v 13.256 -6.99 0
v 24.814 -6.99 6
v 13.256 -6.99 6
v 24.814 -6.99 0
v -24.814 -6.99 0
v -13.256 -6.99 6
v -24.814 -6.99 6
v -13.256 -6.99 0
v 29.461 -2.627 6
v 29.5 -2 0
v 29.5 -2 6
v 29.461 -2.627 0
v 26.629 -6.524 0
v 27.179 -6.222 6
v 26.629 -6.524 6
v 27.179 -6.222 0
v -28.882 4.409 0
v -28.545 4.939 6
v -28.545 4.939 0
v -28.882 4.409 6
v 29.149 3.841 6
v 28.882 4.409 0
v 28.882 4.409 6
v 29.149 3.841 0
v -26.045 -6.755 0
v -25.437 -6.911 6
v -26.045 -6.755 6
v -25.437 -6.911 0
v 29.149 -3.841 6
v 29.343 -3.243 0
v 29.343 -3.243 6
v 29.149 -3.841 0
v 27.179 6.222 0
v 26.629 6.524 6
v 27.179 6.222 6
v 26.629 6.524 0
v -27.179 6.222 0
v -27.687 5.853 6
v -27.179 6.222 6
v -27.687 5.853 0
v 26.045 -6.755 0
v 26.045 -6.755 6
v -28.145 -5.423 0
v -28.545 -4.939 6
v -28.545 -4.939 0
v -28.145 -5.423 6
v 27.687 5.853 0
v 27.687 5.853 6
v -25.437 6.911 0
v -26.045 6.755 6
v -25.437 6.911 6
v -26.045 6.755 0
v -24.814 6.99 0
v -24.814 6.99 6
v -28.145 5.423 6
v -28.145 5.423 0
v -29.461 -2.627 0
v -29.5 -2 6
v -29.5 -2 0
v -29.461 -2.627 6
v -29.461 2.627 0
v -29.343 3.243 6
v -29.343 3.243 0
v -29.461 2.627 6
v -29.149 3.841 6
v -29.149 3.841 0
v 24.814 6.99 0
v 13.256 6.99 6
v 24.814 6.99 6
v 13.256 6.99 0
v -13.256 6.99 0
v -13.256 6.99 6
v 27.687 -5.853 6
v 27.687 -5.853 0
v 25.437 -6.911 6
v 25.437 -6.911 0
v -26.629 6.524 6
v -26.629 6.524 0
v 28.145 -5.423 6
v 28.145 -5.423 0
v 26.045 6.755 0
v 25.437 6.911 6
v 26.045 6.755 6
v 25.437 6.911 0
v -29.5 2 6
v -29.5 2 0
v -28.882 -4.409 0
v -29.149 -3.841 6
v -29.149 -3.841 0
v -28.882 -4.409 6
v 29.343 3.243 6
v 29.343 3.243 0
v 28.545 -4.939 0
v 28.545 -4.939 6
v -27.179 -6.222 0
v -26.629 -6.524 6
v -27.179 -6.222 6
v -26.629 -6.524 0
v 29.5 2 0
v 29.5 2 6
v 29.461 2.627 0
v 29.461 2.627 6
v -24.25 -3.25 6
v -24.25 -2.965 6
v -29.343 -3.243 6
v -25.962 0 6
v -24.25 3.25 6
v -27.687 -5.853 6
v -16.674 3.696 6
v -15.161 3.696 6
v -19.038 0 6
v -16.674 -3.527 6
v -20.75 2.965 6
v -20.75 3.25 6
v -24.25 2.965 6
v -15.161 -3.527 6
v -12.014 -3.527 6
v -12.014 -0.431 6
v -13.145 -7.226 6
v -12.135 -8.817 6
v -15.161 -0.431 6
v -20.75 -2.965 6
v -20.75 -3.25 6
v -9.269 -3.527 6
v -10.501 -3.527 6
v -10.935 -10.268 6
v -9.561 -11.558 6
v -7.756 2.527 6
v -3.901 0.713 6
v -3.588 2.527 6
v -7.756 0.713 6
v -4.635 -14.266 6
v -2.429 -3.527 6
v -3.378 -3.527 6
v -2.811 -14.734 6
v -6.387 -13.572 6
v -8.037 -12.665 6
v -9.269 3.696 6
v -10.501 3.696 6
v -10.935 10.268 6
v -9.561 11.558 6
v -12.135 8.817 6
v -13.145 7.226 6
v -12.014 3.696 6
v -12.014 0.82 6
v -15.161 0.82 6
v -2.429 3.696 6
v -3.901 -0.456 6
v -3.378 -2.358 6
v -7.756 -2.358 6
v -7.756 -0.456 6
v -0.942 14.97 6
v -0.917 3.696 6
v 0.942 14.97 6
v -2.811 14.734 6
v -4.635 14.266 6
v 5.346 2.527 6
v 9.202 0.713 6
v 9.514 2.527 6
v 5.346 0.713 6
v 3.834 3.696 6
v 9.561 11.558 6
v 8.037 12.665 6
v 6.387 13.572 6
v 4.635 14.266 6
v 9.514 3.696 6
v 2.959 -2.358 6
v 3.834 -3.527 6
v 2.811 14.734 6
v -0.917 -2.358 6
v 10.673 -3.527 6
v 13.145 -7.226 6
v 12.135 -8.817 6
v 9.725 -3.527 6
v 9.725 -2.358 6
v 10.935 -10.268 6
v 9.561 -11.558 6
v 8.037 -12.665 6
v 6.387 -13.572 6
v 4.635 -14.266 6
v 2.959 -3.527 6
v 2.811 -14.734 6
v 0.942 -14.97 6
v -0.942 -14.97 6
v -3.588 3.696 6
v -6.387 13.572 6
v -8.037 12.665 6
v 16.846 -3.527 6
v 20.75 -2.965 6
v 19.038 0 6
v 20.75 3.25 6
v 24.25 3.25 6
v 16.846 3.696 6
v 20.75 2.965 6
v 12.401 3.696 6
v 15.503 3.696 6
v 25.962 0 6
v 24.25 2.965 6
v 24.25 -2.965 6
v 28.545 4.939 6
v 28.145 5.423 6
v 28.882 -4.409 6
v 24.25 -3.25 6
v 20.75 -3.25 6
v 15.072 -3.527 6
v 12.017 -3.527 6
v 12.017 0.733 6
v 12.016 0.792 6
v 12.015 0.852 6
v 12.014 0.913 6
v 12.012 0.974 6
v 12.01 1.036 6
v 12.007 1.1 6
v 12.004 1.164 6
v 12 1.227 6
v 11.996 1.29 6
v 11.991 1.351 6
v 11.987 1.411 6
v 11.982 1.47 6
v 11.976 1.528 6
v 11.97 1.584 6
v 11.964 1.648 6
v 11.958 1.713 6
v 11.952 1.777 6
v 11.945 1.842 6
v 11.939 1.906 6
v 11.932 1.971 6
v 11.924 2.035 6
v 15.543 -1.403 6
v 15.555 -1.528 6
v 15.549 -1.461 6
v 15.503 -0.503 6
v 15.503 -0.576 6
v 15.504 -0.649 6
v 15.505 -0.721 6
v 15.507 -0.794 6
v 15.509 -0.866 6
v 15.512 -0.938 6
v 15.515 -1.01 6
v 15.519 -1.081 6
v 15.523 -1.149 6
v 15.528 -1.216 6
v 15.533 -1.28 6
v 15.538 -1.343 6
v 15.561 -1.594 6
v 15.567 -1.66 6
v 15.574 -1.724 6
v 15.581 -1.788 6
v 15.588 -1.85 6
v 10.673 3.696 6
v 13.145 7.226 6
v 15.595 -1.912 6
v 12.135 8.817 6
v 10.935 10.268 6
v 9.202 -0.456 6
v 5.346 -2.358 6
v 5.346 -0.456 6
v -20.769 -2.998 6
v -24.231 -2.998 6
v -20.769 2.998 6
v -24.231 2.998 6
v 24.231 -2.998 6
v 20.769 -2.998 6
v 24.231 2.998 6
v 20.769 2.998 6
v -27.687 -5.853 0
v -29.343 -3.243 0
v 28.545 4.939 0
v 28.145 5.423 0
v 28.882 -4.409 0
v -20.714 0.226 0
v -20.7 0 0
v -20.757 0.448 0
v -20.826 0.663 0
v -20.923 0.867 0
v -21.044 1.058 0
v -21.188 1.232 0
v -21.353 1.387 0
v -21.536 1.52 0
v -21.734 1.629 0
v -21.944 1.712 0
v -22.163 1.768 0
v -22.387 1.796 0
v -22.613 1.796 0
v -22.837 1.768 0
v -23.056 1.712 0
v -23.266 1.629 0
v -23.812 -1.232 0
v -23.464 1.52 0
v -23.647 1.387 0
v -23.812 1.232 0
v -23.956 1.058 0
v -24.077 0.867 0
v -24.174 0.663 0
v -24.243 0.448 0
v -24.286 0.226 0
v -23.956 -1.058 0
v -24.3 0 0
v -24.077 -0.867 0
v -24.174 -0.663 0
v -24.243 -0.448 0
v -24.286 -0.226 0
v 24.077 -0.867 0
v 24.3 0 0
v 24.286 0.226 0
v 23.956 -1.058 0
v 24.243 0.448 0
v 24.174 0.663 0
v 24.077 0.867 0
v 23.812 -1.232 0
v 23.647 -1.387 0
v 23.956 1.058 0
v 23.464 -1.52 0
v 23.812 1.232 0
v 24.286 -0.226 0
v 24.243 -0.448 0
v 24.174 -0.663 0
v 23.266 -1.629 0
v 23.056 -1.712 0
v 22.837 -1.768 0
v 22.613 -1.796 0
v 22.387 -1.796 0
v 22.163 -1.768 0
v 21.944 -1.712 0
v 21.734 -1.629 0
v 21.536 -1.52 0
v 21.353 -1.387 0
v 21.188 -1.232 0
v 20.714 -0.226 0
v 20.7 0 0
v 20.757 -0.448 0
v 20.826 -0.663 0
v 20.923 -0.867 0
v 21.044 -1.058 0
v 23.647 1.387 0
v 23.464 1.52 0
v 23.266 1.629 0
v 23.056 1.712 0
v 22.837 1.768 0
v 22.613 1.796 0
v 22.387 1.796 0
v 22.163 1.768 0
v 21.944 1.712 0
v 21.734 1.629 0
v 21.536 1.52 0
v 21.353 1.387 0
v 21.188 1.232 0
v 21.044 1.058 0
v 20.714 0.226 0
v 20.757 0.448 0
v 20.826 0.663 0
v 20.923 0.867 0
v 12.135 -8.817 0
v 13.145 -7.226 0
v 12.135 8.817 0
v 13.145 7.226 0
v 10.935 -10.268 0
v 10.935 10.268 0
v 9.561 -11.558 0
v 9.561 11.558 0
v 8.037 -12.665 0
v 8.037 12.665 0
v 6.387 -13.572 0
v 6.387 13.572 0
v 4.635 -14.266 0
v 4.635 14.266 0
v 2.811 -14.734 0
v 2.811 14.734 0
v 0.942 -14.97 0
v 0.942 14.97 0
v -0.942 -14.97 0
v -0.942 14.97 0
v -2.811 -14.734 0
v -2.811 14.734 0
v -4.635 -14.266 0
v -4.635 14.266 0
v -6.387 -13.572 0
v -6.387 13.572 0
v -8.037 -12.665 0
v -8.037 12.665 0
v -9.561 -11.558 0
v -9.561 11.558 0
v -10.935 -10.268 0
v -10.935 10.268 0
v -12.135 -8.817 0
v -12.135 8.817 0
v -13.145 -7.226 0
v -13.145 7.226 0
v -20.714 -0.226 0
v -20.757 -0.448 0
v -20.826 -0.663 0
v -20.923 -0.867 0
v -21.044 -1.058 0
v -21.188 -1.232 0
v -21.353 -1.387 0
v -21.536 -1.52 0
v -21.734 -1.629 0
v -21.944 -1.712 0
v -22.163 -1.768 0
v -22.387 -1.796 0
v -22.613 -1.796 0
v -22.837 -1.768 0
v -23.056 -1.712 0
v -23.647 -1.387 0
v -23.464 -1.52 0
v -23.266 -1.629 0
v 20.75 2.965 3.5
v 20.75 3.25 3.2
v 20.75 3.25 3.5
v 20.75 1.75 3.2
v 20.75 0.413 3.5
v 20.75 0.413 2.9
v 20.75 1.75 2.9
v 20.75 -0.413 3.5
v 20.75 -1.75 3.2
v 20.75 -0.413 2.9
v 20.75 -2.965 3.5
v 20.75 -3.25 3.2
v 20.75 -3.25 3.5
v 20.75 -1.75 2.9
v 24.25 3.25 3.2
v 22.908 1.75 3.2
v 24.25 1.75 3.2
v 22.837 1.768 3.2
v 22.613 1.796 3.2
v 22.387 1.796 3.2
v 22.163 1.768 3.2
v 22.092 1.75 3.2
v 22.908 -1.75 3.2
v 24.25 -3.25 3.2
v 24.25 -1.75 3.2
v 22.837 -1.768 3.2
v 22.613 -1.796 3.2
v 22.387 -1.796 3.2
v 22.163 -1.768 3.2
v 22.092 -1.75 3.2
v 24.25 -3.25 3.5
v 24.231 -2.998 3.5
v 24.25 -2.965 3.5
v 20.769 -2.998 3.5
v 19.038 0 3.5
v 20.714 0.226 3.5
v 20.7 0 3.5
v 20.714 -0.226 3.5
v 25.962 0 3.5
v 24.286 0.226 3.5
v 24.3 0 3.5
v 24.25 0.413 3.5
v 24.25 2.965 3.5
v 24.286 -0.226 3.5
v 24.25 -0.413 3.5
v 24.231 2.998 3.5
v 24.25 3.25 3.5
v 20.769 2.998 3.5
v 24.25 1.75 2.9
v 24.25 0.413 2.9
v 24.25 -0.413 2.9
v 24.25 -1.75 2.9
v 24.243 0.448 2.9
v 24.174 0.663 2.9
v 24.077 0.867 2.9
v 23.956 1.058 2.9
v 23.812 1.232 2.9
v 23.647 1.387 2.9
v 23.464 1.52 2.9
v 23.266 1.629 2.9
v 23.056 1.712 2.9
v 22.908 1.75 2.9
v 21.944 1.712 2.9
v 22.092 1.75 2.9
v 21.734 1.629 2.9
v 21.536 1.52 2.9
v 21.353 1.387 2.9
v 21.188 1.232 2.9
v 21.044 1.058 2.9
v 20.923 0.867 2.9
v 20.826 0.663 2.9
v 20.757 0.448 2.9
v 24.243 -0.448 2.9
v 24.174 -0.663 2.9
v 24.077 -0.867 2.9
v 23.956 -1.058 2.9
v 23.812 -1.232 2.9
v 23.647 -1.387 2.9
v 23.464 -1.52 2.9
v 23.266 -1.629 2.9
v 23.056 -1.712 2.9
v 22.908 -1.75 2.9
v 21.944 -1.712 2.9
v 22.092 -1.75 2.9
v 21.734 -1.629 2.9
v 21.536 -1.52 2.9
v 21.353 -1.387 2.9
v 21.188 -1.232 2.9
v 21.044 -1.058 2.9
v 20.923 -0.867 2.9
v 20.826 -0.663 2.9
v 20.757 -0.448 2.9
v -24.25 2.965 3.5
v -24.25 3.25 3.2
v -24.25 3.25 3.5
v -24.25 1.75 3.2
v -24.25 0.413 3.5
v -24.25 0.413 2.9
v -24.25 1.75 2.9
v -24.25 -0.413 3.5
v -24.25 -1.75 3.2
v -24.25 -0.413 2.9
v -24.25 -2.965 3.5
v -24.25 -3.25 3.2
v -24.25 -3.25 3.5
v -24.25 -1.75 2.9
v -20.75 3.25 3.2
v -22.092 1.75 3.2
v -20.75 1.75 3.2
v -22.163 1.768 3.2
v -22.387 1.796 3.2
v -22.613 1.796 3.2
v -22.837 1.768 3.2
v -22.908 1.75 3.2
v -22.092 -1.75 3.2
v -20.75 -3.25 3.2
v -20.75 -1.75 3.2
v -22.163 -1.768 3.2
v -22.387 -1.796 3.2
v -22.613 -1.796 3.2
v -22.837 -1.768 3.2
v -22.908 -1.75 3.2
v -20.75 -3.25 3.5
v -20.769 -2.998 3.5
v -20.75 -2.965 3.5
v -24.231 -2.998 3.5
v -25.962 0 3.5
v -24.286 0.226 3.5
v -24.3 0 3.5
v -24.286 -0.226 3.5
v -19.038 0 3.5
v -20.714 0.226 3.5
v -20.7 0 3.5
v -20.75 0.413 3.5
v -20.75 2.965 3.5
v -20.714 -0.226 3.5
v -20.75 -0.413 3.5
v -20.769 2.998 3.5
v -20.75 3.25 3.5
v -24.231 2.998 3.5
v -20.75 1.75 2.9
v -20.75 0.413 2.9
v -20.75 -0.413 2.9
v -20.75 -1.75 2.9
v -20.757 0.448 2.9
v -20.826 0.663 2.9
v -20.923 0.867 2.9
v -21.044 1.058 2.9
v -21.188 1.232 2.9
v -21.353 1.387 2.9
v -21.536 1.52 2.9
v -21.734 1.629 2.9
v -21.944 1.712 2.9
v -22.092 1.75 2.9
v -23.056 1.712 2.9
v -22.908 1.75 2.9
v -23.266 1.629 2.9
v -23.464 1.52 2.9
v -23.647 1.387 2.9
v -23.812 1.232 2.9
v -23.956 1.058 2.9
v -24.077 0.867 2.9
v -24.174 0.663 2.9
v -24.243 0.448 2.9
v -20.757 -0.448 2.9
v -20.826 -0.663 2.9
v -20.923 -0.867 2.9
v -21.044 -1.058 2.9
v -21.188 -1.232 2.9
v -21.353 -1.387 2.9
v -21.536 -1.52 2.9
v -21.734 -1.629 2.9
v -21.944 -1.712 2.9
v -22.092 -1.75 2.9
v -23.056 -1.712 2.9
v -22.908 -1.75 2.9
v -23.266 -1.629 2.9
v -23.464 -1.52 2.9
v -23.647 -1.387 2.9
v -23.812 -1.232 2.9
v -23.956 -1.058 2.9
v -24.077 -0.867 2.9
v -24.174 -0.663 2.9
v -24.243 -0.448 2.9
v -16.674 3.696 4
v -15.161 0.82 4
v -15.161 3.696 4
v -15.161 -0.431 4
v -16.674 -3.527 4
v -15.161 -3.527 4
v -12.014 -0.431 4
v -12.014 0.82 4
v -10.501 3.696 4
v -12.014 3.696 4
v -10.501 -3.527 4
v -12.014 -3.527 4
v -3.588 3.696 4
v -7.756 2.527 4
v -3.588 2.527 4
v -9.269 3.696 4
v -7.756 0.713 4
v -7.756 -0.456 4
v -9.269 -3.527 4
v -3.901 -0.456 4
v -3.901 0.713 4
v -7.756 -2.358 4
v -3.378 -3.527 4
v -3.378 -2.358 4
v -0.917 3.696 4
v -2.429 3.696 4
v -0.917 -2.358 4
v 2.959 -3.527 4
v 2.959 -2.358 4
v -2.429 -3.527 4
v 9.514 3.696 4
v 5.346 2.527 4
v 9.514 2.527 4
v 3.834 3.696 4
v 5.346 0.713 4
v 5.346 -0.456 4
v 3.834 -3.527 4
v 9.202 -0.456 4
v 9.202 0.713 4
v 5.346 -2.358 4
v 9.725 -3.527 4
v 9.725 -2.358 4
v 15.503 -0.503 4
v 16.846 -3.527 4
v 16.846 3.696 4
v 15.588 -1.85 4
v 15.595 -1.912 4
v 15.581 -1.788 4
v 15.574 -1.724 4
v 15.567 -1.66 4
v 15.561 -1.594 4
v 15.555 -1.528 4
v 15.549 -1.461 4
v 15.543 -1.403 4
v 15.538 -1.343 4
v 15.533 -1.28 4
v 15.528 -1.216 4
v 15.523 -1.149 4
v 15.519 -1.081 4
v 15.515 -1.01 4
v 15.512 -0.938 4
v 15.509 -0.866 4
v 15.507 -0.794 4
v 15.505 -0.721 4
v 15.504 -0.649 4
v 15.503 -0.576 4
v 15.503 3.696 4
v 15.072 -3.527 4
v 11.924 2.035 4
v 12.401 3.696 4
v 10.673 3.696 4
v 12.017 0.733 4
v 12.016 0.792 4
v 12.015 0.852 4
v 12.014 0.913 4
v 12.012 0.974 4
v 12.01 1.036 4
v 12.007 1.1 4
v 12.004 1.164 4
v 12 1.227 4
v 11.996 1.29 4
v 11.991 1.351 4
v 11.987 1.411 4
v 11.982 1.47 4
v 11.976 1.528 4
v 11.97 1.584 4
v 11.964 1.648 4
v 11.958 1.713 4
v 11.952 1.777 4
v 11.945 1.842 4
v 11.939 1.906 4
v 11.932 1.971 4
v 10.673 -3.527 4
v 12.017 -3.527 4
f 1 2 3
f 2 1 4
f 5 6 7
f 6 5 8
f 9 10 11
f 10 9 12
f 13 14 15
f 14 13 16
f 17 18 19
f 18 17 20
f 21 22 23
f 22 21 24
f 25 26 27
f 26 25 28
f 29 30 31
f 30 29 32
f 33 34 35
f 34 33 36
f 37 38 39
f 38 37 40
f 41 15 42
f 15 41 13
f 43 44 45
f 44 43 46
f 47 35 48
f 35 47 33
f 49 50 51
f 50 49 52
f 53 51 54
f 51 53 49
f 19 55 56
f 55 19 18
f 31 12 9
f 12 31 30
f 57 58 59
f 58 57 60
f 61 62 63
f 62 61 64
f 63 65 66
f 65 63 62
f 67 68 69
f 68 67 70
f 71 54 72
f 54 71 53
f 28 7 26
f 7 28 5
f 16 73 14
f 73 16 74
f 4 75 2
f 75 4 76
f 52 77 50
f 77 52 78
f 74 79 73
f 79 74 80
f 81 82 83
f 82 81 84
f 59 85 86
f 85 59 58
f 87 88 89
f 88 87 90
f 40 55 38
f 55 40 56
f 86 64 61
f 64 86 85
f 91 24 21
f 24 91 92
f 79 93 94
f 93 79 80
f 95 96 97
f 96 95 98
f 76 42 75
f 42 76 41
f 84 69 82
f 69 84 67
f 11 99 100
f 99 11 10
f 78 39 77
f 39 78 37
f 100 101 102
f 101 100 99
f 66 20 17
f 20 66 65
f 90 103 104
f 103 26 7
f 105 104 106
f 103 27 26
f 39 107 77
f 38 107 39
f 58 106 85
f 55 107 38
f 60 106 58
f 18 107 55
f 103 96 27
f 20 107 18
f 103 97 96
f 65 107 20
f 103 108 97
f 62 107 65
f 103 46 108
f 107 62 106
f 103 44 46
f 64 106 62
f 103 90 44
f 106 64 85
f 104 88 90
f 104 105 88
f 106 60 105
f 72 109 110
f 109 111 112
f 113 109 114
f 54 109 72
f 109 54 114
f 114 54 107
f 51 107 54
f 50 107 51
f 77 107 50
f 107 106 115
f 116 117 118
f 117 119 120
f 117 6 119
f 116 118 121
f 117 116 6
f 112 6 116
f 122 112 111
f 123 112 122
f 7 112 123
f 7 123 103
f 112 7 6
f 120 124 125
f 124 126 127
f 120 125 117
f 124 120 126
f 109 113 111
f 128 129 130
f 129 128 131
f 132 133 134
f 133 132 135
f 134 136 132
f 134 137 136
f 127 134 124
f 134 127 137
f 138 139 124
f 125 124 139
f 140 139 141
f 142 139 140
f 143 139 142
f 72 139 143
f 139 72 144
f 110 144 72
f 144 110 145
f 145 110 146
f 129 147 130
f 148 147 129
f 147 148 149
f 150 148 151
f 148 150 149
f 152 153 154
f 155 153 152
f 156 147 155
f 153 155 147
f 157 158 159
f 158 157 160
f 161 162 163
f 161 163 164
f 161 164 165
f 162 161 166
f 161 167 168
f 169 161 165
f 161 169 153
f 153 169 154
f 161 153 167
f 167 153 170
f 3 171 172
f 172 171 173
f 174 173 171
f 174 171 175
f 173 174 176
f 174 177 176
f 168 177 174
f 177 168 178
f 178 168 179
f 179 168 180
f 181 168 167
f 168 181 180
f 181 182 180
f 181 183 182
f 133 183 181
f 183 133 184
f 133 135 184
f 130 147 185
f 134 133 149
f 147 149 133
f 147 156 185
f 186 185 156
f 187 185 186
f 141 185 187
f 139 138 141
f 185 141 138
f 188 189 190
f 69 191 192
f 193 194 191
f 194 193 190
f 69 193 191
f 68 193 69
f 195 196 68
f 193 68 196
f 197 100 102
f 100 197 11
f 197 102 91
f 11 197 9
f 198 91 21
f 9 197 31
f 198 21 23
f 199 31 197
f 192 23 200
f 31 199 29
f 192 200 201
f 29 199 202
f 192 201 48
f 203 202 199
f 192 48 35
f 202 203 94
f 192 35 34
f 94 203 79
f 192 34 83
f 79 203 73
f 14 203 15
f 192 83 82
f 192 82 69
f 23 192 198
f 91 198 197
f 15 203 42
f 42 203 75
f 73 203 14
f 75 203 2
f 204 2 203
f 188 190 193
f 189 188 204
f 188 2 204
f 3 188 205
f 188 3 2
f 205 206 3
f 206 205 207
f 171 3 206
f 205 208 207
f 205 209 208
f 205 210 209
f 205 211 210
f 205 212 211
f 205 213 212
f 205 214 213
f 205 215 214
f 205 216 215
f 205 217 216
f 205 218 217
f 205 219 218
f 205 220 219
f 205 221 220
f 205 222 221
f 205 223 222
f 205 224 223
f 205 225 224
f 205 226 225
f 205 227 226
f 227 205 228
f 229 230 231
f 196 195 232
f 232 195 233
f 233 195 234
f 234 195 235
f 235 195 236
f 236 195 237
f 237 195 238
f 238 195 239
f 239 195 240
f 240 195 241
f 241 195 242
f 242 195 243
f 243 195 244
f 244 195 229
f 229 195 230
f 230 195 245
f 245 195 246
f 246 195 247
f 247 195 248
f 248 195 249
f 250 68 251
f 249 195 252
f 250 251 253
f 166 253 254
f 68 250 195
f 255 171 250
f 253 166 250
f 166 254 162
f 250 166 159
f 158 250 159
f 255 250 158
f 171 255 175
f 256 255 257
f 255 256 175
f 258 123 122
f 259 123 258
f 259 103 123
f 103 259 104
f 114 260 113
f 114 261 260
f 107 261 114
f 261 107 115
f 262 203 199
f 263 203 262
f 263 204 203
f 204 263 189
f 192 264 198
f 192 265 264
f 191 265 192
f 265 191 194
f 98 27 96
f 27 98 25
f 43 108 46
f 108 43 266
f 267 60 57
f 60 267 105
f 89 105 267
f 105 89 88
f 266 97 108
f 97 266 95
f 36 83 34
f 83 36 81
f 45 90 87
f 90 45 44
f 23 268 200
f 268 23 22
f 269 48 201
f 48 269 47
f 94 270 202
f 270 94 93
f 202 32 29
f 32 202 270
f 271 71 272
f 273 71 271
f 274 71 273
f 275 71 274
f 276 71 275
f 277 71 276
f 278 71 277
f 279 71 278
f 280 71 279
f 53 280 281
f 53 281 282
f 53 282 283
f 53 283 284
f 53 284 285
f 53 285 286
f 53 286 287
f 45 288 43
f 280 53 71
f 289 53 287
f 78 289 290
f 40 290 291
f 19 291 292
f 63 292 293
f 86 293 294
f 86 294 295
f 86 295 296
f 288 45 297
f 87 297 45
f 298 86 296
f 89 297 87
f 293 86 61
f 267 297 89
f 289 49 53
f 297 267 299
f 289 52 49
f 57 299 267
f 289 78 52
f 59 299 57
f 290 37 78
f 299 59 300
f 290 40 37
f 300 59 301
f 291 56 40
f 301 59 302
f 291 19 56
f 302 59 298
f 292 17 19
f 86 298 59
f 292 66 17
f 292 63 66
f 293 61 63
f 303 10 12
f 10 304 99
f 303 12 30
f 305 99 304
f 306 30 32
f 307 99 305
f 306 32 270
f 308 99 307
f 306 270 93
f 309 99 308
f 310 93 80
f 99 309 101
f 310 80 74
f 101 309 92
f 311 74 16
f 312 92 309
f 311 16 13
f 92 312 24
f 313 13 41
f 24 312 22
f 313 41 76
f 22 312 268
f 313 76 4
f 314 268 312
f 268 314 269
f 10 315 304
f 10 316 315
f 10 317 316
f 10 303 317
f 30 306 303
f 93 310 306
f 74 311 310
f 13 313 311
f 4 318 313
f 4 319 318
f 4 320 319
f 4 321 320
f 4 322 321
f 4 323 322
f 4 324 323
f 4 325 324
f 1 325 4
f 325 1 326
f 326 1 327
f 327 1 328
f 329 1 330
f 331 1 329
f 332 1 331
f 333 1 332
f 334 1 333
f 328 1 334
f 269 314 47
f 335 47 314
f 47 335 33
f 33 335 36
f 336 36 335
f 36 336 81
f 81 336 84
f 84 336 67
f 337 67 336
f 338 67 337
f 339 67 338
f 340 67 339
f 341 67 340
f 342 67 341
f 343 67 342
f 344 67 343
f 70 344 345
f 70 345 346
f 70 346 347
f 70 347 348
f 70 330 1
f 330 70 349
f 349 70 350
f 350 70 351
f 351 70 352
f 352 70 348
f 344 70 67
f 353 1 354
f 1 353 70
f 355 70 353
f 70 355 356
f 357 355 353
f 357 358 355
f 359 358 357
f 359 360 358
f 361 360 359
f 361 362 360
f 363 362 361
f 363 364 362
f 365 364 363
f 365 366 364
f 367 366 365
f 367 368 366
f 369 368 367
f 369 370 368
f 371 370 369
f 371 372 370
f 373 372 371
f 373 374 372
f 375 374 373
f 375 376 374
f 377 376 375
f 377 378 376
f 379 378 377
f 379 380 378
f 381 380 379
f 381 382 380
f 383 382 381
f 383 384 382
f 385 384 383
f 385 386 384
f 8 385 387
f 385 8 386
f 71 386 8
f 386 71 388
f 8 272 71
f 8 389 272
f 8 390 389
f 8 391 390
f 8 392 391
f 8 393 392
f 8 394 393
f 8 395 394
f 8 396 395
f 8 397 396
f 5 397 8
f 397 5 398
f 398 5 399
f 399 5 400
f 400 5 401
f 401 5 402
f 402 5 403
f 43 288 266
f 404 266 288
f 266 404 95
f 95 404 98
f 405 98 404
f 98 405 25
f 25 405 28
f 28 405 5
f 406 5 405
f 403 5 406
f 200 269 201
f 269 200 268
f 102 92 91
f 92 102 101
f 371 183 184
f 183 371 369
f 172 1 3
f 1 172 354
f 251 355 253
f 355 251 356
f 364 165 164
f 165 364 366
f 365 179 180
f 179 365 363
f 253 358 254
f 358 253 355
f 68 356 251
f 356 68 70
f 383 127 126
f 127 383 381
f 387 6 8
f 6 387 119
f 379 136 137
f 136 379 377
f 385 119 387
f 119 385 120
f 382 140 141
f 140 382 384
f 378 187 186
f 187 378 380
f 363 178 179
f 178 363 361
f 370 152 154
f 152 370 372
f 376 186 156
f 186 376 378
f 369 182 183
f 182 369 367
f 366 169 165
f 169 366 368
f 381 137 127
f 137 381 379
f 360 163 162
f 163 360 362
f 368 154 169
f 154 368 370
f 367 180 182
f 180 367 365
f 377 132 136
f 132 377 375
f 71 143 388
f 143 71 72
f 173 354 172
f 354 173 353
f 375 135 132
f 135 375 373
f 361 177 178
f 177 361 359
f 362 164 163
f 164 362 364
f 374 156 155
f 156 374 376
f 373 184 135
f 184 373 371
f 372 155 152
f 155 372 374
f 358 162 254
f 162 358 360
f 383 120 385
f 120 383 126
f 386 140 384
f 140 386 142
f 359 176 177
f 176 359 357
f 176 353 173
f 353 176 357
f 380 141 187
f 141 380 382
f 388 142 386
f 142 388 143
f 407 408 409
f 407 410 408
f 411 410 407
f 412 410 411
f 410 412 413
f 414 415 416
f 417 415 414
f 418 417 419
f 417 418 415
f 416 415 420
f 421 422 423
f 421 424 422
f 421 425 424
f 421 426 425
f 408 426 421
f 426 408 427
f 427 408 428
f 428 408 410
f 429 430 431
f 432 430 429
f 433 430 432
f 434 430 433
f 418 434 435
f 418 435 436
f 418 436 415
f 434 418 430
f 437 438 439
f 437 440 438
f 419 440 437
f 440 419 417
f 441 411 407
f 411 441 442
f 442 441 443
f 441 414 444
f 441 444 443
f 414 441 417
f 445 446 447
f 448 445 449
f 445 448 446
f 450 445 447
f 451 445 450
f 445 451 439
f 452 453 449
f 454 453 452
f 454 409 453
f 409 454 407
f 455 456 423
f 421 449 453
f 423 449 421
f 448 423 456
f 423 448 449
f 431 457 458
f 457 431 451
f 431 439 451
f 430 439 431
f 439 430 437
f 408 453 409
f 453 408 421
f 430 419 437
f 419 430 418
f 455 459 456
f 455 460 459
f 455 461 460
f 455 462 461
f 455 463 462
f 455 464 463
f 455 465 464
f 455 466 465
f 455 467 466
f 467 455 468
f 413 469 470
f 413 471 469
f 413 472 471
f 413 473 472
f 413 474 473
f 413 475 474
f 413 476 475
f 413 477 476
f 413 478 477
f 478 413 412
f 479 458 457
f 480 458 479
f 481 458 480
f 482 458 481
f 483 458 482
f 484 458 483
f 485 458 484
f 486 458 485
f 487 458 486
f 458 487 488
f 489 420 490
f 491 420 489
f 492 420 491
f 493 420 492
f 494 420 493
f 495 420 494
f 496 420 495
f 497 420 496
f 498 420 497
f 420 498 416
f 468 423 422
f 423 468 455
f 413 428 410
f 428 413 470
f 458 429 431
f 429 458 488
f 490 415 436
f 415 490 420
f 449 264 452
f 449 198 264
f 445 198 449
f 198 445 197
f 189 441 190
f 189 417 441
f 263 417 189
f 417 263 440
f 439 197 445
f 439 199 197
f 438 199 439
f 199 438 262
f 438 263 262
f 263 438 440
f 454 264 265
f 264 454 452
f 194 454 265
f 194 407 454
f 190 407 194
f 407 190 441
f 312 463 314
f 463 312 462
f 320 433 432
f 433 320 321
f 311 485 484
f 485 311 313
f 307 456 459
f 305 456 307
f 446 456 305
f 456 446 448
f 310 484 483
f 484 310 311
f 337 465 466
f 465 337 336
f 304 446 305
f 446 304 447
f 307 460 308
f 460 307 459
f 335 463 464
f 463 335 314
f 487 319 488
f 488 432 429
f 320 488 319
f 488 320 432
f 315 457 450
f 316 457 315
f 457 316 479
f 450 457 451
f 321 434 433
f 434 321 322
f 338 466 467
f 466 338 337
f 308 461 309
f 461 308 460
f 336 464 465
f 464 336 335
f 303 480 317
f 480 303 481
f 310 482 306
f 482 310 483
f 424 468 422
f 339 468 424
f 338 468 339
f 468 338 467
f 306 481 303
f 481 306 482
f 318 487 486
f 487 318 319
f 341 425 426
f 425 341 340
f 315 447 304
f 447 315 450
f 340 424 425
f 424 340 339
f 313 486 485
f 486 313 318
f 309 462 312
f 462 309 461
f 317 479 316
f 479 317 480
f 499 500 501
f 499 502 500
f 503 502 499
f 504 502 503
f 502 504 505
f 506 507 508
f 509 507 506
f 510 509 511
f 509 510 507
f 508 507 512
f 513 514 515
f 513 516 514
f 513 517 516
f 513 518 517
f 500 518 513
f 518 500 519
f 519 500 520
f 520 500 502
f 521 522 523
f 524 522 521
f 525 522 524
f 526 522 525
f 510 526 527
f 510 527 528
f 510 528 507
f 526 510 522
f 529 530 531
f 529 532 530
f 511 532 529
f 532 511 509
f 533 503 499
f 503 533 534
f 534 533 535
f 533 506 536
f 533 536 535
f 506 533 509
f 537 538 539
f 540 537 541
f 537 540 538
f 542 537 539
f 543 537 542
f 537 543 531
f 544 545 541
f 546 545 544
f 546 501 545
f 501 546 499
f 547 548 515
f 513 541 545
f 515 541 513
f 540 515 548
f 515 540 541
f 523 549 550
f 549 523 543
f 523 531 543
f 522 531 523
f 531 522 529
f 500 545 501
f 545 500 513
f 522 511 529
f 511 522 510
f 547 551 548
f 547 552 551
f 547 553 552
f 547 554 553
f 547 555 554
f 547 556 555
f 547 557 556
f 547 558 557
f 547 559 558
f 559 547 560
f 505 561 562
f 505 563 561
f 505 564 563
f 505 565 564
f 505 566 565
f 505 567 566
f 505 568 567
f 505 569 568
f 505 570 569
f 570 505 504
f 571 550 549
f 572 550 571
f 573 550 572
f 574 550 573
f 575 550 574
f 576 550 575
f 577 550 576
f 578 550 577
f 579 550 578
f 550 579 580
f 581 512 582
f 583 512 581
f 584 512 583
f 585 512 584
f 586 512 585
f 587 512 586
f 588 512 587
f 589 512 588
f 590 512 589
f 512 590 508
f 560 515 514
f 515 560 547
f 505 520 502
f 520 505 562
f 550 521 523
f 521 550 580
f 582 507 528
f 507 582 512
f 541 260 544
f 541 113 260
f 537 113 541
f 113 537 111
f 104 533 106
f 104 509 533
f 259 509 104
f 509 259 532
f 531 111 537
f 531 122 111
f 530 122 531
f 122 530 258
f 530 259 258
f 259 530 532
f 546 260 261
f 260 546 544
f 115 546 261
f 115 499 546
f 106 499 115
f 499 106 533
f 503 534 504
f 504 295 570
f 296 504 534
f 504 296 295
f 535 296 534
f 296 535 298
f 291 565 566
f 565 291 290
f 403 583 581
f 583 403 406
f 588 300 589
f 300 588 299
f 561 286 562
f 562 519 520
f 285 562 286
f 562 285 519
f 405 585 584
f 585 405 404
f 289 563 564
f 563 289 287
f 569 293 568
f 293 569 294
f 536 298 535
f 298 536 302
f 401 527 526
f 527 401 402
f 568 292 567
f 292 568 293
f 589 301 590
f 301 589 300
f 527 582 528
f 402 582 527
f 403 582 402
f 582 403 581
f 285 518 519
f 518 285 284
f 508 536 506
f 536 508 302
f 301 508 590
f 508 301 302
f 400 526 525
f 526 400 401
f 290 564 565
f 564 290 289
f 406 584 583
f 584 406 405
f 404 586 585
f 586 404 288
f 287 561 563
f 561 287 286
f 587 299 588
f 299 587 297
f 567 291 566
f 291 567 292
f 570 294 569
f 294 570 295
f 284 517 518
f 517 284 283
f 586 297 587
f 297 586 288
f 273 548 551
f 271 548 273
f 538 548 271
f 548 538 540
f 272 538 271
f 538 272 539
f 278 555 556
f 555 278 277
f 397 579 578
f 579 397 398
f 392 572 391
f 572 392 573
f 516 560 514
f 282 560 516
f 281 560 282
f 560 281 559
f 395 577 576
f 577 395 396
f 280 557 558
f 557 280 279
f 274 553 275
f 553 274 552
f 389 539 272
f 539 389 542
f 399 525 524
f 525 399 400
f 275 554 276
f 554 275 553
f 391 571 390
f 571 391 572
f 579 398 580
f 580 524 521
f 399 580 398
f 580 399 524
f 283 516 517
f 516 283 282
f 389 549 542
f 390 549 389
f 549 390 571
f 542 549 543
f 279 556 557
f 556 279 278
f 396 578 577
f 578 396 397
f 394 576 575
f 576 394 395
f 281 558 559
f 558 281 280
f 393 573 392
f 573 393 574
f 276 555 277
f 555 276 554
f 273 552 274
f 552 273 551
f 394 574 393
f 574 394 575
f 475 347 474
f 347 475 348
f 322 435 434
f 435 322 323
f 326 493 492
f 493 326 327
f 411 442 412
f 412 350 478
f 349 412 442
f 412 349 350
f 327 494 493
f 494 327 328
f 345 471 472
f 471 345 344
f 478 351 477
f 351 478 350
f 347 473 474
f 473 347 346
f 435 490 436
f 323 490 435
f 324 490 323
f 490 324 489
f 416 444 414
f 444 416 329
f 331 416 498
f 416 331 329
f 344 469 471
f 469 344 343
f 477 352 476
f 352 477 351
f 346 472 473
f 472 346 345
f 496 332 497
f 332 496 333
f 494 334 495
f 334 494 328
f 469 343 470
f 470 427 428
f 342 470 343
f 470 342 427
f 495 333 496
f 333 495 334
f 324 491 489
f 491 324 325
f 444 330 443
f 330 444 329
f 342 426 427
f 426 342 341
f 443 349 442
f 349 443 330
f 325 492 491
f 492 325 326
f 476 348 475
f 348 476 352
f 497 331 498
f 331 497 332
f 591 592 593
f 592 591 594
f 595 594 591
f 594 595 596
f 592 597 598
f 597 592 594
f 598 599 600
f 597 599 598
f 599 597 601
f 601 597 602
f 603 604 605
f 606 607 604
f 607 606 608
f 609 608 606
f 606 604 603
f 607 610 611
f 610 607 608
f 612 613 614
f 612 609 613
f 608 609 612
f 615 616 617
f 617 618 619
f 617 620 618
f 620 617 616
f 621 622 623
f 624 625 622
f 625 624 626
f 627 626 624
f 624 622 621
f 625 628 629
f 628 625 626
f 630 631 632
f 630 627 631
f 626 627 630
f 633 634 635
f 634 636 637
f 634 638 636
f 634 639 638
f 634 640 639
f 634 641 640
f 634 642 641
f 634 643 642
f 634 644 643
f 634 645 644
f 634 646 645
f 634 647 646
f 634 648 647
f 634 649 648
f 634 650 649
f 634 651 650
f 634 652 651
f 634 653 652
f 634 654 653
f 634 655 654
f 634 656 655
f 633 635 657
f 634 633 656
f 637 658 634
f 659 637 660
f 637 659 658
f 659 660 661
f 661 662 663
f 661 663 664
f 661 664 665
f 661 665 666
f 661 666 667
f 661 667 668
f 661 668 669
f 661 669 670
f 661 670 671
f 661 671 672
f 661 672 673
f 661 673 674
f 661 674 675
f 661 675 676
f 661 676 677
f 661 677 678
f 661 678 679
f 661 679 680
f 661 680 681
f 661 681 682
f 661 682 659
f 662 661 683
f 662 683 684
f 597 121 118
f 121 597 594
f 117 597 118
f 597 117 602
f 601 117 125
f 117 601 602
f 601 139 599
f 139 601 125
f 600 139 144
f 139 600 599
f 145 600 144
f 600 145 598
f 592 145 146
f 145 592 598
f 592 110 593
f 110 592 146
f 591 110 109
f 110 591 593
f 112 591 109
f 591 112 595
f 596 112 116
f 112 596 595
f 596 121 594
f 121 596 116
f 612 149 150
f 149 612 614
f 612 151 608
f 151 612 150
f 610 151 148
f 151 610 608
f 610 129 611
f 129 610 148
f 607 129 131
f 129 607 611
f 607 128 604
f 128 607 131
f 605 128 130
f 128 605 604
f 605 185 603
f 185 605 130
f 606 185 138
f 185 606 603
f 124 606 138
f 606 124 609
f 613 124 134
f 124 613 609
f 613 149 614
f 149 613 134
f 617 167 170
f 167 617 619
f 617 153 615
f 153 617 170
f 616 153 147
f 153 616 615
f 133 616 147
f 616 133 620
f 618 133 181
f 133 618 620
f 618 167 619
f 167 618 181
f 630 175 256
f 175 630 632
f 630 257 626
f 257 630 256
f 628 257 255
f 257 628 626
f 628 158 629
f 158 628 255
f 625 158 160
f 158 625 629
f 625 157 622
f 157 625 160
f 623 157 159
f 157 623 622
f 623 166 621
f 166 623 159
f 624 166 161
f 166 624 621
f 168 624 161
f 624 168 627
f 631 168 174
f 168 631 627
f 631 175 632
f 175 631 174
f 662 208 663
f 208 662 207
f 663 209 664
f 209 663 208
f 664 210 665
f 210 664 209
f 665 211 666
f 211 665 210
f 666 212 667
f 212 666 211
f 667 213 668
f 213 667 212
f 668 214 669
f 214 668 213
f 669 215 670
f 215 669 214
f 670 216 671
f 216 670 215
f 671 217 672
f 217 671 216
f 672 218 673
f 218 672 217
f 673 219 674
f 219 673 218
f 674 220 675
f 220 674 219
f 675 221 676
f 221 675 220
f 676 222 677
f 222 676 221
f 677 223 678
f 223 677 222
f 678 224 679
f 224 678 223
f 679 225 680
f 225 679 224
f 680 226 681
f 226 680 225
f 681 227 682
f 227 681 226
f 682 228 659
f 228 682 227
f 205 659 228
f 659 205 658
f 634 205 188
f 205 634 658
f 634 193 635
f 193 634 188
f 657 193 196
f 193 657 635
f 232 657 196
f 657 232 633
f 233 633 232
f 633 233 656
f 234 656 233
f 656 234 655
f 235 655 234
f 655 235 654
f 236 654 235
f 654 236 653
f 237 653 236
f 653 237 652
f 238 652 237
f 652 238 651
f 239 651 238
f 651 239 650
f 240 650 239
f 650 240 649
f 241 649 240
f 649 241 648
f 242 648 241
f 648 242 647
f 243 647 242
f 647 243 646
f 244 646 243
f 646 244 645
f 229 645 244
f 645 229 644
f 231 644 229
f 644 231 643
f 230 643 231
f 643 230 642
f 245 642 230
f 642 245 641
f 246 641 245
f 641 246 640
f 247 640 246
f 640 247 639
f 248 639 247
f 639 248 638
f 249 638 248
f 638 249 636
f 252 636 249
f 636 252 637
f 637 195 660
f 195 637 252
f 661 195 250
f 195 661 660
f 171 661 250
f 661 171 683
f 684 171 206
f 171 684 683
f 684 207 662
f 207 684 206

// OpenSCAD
$fn = 50;


difference() {
	union() {
		hull() {
			translate(v = [-24.5000000000, 2.0000000000, 0]) {
				cylinder(h = 6, r = 5);
			}
			translate(v = [24.5000000000, 2.0000000000, 0]) {
				cylinder(h = 6, r = 5);
			}
			translate(v = [-24.5000000000, -2.0000000000, 0]) {
				cylinder(h = 6, r = 5);
			}
			translate(v = [24.5000000000, -2.0000000000, 0]) {
				cylinder(h = 6, r = 5);
			}
		}
		cylinder(h = 6, r = 15.0000000000);
	}
	union() {
		translate(v = [22.5000000000, 0, -20]) {
			rotate(a = [0, 180, 0]) {
				difference() {
					union() {
						translate(v = [0, 0, -26.0000000000]) {
							rotate(a = [0, 0, 0]) {
								difference() {
									union() {
										#translate(v = [-1.7500000000, -3.2500000000, -0.3000000000]) {
											cube(size = [3.5000000000, 6.5000000000, 0.3000000000]);
										}
										#translate(v = [-1.7500000000, -1.7500000000, -0.6000000000]) {
											cube(size = [3.5000000000, 3.5000000000, 0.3000000000]);
										}
										#translate(v = [-1.7500000000, -3.2500000000, 2.5000000000]) {
											cube(size = [3.5000000000, 6.5000000000, 0.3000000000]);
										}
										#translate(v = [-1.7500000000, -1.7500000000, 2.8000000000]) {
											cube(size = [3.5000000000, 3.5000000000, 0.3000000000]);
										}
										#linear_extrude(height = 2.5000000000) {
											polygon(points = [[3.4620000000, 0.0000000000], [1.7310000000, 2.9981799479], [-1.7310000000, 2.9981799479], [-3.4620000000, 0.0000000000], [-1.7310000000, -2.9981799479], [1.7310000000, -2.9981799479]]);
										}
										#translate(v = [-1.7500000000, -3.2500000000, -0.3000000000]) {
											cube(size = [3.5000000000, 6.5000000000, 0.3000000000]);
										}
										#translate(v = [-1.7500000000, -1.7500000000, -0.6000000000]) {
											cube(size = [3.5000000000, 3.5000000000, 0.3000000000]);
										}
										#translate(v = [-1.7500000000, -3.2500000000, 2.5000000000]) {
											cube(size = [3.5000000000, 6.5000000000, 0.3000000000]);
										}
										#translate(v = [-1.7500000000, -1.7500000000, 2.8000000000]) {
											cube(size = [3.5000000000, 3.5000000000, 0.3000000000]);
										}
										#translate(v = [-1.7500000000, -3.2500000000, -0.3000000000]) {
											cube(size = [3.5000000000, 6.5000000000, 0.3000000000]);
										}
										#translate(v = [-1.7500000000, -1.7500000000, -0.6000000000]) {
											cube(size = [3.5000000000, 3.5000000000, 0.3000000000]);
										}
										#translate(v = [-1.7500000000, -3.2500000000, 2.5000000000]) {
											cube(size = [3.5000000000, 6.5000000000, 0.3000000000]);
										}
										#translate(v = [-1.7500000000, -1.7500000000, 2.8000000000]) {
											cube(size = [3.5000000000, 3.5000000000, 0.3000000000]);
										}
									}
									union();
								}
							}
						}
						translate(v = [0, 0, -26.0000000000]) {
							rotate(a = [0, 0, 0]) {
								difference() {
									union() {
										#translate(v = [-1.7500000000, -3.2500000000, -0.3000000000]) {
											cube(size = [3.5000000000, 6.5000000000, 0.3000000000]);
										}
										#translate(v = [-1.7500000000, -1.7500000000, -0.6000000000]) {
											cube(size = [3.5000000000, 3.5000000000, 0.3000000000]);
										}
										#translate(v = [-1.7500000000, -3.2500000000, 2.5000000000]) {
											cube(size = [3.5000000000, 6.5000000000, 0.3000000000]);
										}
										#translate(v = [-1.7500000000, -1.7500000000, 2.8000000000]) {
											cube(size = [3.5000000000, 3.5000000000, 0.3000000000]);
										}
										#linear_extrude(height = 2.5000000000) {
											polygon(points = [[3.4620000000, 0.0000000000], [1.7310000000, 2.9981799479], [-1.7310000000, 2.9981799479], [-3.4620000000, 0.0000000000], [-1.7310000000, -2.9981799479], [1.7310000000, -2.9981799479]]);
										}
										#translate(v = [-1.7500000000, -3.2500000000, -0.3000000000]) {
											cube(size = [3.5000000000, 6.5000000000, 0.3000000000]);
										}
										#translate(v = [-1.7500000000, -1.7500000000, -0.6000000000]) {
											cube(size = [3.5000000000, 3.5000000000, 0.3000000000]);
										}
										#translate(v = [-1.7500000000, -3.2500000000, 2.5000000000]) {
											cube(size = [3.5000000000, 6.5000000000, 0.3000000000]);
										}
										#translate(v = [-1.7500000000, -1.7500000000, 2.8000000000]) {
											cube(size = [3.5000000000, 3.5000000000, 0.3000000000]);
										}
										#translate(v = [-1.7500000000, -3.2500000000, -0.3000000000]) {
											cube(size = [3.5000000000, 6.5000000000, 0.3000000000]);
										}
										#translate(v = [-1.7500000000, -1.7500000000, -0.6000000000]) {
											cube(size = [3.5000000000, 3.5000000000, 0.3000000000]);
										}
										#translate(v = [-1.7500000000, -3.2500000000, 2.5000000000]) {
											cube(size = [3.5000000000, 6.5000000000, 0.3000000000]);
										}
										#translate(v = [-1.7500000000, -1.7500000000, 2.8000000000]) {
											cube(size = [3.5000000000, 3.5000000000, 0.3000000000]);
										}
									}
									union();
								}
							}
						}
						translate(v = [0, 0, -26.0000000000]) {
							rotate(a = [0, 0, 0]) {
								difference() {
									union() {
										#translate(v = [-1.7500000000, -3.2500000000, -0.3000000000]) {
											cube(size = [3.5000000000, 6.5000000000, 0.3000000000]);
										}
										#translate(v = [-1.7500000000, -1.7500000000, -0.6000000000]) {
											cube(size = [3.5000000000, 3.5000000000, 0.3000000000]);
										}
										#translate(v = [-1.7500000000, -3.2500000000, 2.5000000000]) {
											cube(size = [3.5000000000, 6.5000000000, 0.3000000000]);
										}
										#translate(v = [-1.7500000000, -1.7500000000, 2.8000000000]) {
											cube(size = [3.5000000000, 3.5000000000, 0.3000000000]);
										}
										#linear_extrude(height = 2.5000000000) {
											polygon(points = [[3.4620000000, 0.0000000000], [1.7310000000, 2.9981799479], [-1.7310000000, 2.9981799479], [-3.4620000000, 0.0000000000], [-1.7310000000, -2.9981799479], [1.7310000000, -2.9981799479]]);
										}
										#translate(v = [-1.7500000000, -3.2500000000, -0.3000000000]) {
											cube(size = [3.5000000000, 6.5000000000, 0.3000000000]);
										}
										#translate(v = [-1.7500000000, -1.7500000000, -0.6000000000]) {
											cube(size = [3.5000000000, 3.5000000000, 0.3000000000]);
										}
										#translate(v = [-1.7500000000, -3.2500000000, 2.5000000000]) {
											cube(size = [3.5000000000, 6.5000000000, 0.3000000000]);
										}
										#translate(v = [-1.7500000000, -1.7500000000, 2.8000000000]) {
											cube(size = [3.5000000000, 3.5000000000, 0.3000000000]);
										}
										#translate(v = [-1.7500000000, -3.2500000000, -0.3000000000]) {
											cube(size = [3.5000000000, 6.5000000000, 0.3000000000]);
										}
										#translate(v = [-1.7500000000, -1.7500000000, -0.6000000000]) {
											cube(size = [3.5000000000, 3.5000000000, 0.3000000000]);
										}
										#translate(v = [-1.7500000000, -3.2500000000, 2.5000000000]) {
											cube(size = [3.5000000000, 6.5000000000, 0.3000000000]);
										}
										#translate(v = [-1.7500000000, -1.7500000000, 2.8000000000]) {
											cube(size = [3.5000000000, 3.5000000000, 0.3000000000]);
										}
									}
									union();
								}
							}
						}
						#translate(v = [0, 0, -26.0000000000]) {
							cylinder(h = 26, r = 1.5000000000);
						}
						#translate(v = [0, 0, -1.9000000000]) {
							cylinder(h = 1.9000000000, r1 = 1.8000000000, r2 = 3.6000000000);
						}
						#translate(v = [0, 0, -26.0000000000]) {
							cylinder(h = 26, r = 1.8000000000);
						}
						#translate(v = [0, 0, -26.0000000000]) {
							cylinder(h = 26, r = 1.5000000000);
						}
					}
					union();
				}
			}
		}
		translate(v = [-22.5000000000, 0, -20]) {
			rotate(a = [0, 180, 0]) {
				difference() {
					union() {
						translate(v = [0, 0, -26.0000000000]) {
							rotate(a = [0, 0, 0]) {
								difference() {
									union() {
										#translate(v = [-1.7500000000, -3.2500000000, -0.3000000000]) {
											cube(size = [3.5000000000, 6.5000000000, 0.3000000000]);
										}
										#translate(v = [-1.7500000000, -1.7500000000, -0.6000000000]) {
											cube(size = [3.5000000000, 3.5000000000, 0.3000000000]);
										}
										#translate(v = [-1.7500000000, -3.2500000000, 2.5000000000]) {
											cube(size = [3.5000000000, 6.5000000000, 0.3000000000]);
										}
										#translate(v = [-1.7500000000, -1.7500000000, 2.8000000000]) {
											cube(size = [3.5000000000, 3.5000000000, 0.3000000000]);
										}
										#linear_extrude(height = 2.5000000000) {
											polygon(points = [[3.4620000000, 0.0000000000], [1.7310000000, 2.9981799479], [-1.7310000000, 2.9981799479], [-3.4620000000, 0.0000000000], [-1.7310000000, -2.9981799479], [1.7310000000, -2.9981799479]]);
										}
										#translate(v = [-1.7500000000, -3.2500000000, -0.3000000000]) {
											cube(size = [3.5000000000, 6.5000000000, 0.3000000000]);
										}
										#translate(v = [-1.7500000000, -1.7500000000, -0.6000000000]) {
											cube(size = [3.5000000000, 3.5000000000, 0.3000000000]);
										}
										#translate(v = [-1.7500000000, -3.2500000000, 2.5000000000]) {
											cube(size = [3.5000000000, 6.5000000000, 0.3000000000]);
										}
										#translate(v = [-1.7500000000, -1.7500000000, 2.8000000000]) {
											cube(size = [3.5000000000, 3.5000000000, 0.3000000000]);
										}
										#translate(v = [-1.7500000000, -3.2500000000, -0.3000000000]) {
											cube(size = [3.5000000000, 6.5000000000, 0.3000000000]);
										}
										#translate(v = [-1.7500000000, -1.7500000000, -0.6000000000]) {
											cube(size = [3.5000000000, 3.5000000000, 0.3000000000]);
										}
										#translate(v = [-1.7500000000, -3.2500000000, 2.5000000000]) {
											cube(size = [3.5000000000, 6.5000000000, 0.3000000000]);
										}
										#translate(v = [-1.7500000000, -1.7500000000, 2.8000000000]) {
											cube(size = [3.5000000000, 3.5000000000, 0.3000000000]);
										}
									}
									union();
								}
							}
						}
						translate(v = [0, 0, -26.0000000000]) {
							rotate(a = [0, 0, 0]) {
								difference() {
									union() {
										#translate(v = [-1.7500000000, -3.2500000000, -0.3000000000]) {
											cube(size = [3.5000000000, 6.5000000000, 0.3000000000]);
										}
										#translate(v = [-1.7500000000, -1.7500000000, -0.6000000000]) {
											cube(size = [3.5000000000, 3.5000000000, 0.3000000000]);
										}
										#translate(v = [-1.7500000000, -3.2500000000, 2.5000000000]) {
											cube(size = [3.5000000000, 6.5000000000, 0.3000000000]);
										}
										#translate(v = [-1.7500000000, -1.7500000000, 2.8000000000]) {
											cube(size = [3.5000000000, 3.5000000000, 0.3000000000]);
										}
										#linear_extrude(height = 2.5000000000) {
											polygon(points = [[3.4620000000, 0.0000000000], [1.7310000000, 2.9981799479], [-1.7310000000, 2.9981799479], [-3.4620000000, 0.0000000000], [-1.7310000000, -2.9981799479], [1.7310000000, -2.9981799479]]);
										}
										#translate(v = [-1.7500000000, -3.2500000000, -0.3000000000]) {
											cube(size = [3.5000000000, 6.5000000000, 0.3000000000]);
										}
										#translate(v = [-1.7500000000, -1.7500000000, -0.6000000000]) {
											cube(size = [3.5000000000, 3.5000000000, 0.3000000000]);
										}
										#translate(v = [-1.7500000000, -3.2500000000, 2.5000000000]) {
											cube(size = [3.5000000000, 6.5000000000, 0.3000000000]);
										}
										#translate(v = [-1.7500000000, -1.7500000000, 2.8000000000]) {
											cube(size = [3.5000000000, 3.5000000000, 0.3000000000]);
										}
										#translate(v = [-1.7500000000, -3.2500000000, -0.3000000000]) {
											cube(size = [3.5000000000, 6.5000000000, 0.3000000000]);
										}
										#translate(v = [-1.7500000000, -1.7500000000, -0.6000000000]) {
											cube(size = [3.5000000000, 3.5000000000, 0.3000000000]);
										}
										#translate(v = [-1.7500000000, -3.2500000000, 2.5000000000]) {
											cube(size = [3.5000000000, 6.5000000000, 0.3000000000]);
										}
										#translate(v = [-1.7500000000, -1.7500000000, 2.8000000000]) {
											cube(size = [3.5000000000, 3.5000000000, 0.3000000000]);
										}
									}
									union();
								}
							}
						}
						translate(v = [0, 0, -26.0000000000]) {
							rotate(a = [0, 0, 0]) {
								difference() {
									union() {
										#translate(v = [-1.7500000000, -3.2500000000, -0.3000000000]) {
											cube(size = [3.5000000000, 6.5000000000, 0.3000000000]);
										}
										#translate(v = [-1.7500000000, -1.7500000000, -0.6000000000]) {
											cube(size = [3.5000000000, 3.5000000000, 0.3000000000]);
										}
										#translate(v = [-1.7500000000, -3.2500000000, 2.5000000000]) {
											cube(size = [3.5000000000, 6.5000000000, 0.3000000000]);
										}
										#translate(v = [-1.7500000000, -1.7500000000, 2.8000000000]) {
											cube(size = [3.5000000000, 3.5000000000, 0.3000000000]);
										}
										#linear_extrude(height = 2.5000000000) {
											polygon(points = [[3.4620000000, 0.0000000000], [1.7310000000, 2.9981799479], [-1.7310000000, 2.9981799479], [-3.4620000000, 0.0000000000], [-1.7310000000, -2.9981799479], [1.7310000000, -2.9981799479]]);
										}
										#translate(v = [-1.7500000000, -3.2500000000, -0.3000000000]) {
											cube(size = [3.5000000000, 6.5000000000, 0.3000000000]);
										}
										#translate(v = [-1.7500000000, -1.7500000000, -0.6000000000]) {
											cube(size = [3.5000000000, 3.5000000000, 0.3000000000]);
										}
										#translate(v = [-1.7500000000, -3.2500000000, 2.5000000000]) {
											cube(size = [3.5000000000, 6.5000000000, 0.3000000000]);
										}
										#translate(v = [-1.7500000000, -1.7500000000, 2.8000000000]) {
											cube(size = [3.5000000000, 3.5000000000, 0.3000000000]);
										}
										#translate(v = [-1.7500000000, -3.2500000000, -0.3000000000]) {
											cube(size = [3.5000000000, 6.5000000000, 0.3000000000]);
										}
										#translate(v = [-1.7500000000, -1.7500000000, -0.6000000000]) {
											cube(size = [3.5000000000, 3.5000000000, 0.3000000000]);
										}
										#translate(v = [-1.7500000000, -3.2500000000, 2.5000000000]) {
											cube(size = [3.5000000000, 6.5000000000, 0.3000000000]);
										}
										#translate(v = [-1.7500000000, -1.7500000000, 2.8000000000]) {
											cube(size = [3.5000000000, 3.5000000000, 0.3000000000]);
										}
									}
									union();
								}
							}
						}
						#translate(v = [0, 0, -26.0000000000]) {
							cylinder(h = 26, r = 1.5000000000);
						}
						#translate(v = [0, 0, -1.9000000000]) {
							cylinder(h = 1.9000000000, r1 = 1.8000000000, r2 = 3.6000000000);
						}
						#translate(v = [0, 0, -26.0000000000]) {
							cylinder(h = 26, r = 1.8000000000);
						}
						#translate(v = [0, 0, -26.0000000000]) {
							cylinder(h = 26, r = 1.5000000000);
						}
					}
					union();
				}
			}
		}
		translate(v = [-22.5000000000, 0.0000000000, 0]) {
			cylinder(h = 6, r = 1.8000000000);
		}
		translate(v = [22.5000000000, 0.0000000000, 0]) {
			cylinder(h = 6, r = 1.8000000000);
		}
		translate(v = [-22.5000000000, 0.0000000000, 0]) {
			cylinder(h = 6, r = 1.8000000000);
		}
		translate(v = [22.5000000000, 0.0000000000, 0]) {
			cylinder(h = 6, r = 1.8000000000);
		}
		translate(v = [-22.5000000000, 0.0000000000, 0]) {
			cylinder(h = 6, r = 1.8000000000);
		}
		translate(v = [22.5000000000, 0.0000000000, 0]) {
			cylinder(h = 6, r = 1.8000000000);
		}
		translate(v = [-22.5000000000, 0.0000000000, 0]) {
			cylinder(h = 6, r = 1.8000000000);
		}
		translate(v = [22.5000000000, 0.0000000000, 0]) {
			cylinder(h = 6, r = 1.8000000000);
		}
		#translate(v = [0, 0, 4]) {
			linear_extrude(height = 2) {
				text(font = "Arial:Bold", halign = "center", size = 7.5600000000, text = "HELEN", valign = "center");
			}
		}
	}
}
